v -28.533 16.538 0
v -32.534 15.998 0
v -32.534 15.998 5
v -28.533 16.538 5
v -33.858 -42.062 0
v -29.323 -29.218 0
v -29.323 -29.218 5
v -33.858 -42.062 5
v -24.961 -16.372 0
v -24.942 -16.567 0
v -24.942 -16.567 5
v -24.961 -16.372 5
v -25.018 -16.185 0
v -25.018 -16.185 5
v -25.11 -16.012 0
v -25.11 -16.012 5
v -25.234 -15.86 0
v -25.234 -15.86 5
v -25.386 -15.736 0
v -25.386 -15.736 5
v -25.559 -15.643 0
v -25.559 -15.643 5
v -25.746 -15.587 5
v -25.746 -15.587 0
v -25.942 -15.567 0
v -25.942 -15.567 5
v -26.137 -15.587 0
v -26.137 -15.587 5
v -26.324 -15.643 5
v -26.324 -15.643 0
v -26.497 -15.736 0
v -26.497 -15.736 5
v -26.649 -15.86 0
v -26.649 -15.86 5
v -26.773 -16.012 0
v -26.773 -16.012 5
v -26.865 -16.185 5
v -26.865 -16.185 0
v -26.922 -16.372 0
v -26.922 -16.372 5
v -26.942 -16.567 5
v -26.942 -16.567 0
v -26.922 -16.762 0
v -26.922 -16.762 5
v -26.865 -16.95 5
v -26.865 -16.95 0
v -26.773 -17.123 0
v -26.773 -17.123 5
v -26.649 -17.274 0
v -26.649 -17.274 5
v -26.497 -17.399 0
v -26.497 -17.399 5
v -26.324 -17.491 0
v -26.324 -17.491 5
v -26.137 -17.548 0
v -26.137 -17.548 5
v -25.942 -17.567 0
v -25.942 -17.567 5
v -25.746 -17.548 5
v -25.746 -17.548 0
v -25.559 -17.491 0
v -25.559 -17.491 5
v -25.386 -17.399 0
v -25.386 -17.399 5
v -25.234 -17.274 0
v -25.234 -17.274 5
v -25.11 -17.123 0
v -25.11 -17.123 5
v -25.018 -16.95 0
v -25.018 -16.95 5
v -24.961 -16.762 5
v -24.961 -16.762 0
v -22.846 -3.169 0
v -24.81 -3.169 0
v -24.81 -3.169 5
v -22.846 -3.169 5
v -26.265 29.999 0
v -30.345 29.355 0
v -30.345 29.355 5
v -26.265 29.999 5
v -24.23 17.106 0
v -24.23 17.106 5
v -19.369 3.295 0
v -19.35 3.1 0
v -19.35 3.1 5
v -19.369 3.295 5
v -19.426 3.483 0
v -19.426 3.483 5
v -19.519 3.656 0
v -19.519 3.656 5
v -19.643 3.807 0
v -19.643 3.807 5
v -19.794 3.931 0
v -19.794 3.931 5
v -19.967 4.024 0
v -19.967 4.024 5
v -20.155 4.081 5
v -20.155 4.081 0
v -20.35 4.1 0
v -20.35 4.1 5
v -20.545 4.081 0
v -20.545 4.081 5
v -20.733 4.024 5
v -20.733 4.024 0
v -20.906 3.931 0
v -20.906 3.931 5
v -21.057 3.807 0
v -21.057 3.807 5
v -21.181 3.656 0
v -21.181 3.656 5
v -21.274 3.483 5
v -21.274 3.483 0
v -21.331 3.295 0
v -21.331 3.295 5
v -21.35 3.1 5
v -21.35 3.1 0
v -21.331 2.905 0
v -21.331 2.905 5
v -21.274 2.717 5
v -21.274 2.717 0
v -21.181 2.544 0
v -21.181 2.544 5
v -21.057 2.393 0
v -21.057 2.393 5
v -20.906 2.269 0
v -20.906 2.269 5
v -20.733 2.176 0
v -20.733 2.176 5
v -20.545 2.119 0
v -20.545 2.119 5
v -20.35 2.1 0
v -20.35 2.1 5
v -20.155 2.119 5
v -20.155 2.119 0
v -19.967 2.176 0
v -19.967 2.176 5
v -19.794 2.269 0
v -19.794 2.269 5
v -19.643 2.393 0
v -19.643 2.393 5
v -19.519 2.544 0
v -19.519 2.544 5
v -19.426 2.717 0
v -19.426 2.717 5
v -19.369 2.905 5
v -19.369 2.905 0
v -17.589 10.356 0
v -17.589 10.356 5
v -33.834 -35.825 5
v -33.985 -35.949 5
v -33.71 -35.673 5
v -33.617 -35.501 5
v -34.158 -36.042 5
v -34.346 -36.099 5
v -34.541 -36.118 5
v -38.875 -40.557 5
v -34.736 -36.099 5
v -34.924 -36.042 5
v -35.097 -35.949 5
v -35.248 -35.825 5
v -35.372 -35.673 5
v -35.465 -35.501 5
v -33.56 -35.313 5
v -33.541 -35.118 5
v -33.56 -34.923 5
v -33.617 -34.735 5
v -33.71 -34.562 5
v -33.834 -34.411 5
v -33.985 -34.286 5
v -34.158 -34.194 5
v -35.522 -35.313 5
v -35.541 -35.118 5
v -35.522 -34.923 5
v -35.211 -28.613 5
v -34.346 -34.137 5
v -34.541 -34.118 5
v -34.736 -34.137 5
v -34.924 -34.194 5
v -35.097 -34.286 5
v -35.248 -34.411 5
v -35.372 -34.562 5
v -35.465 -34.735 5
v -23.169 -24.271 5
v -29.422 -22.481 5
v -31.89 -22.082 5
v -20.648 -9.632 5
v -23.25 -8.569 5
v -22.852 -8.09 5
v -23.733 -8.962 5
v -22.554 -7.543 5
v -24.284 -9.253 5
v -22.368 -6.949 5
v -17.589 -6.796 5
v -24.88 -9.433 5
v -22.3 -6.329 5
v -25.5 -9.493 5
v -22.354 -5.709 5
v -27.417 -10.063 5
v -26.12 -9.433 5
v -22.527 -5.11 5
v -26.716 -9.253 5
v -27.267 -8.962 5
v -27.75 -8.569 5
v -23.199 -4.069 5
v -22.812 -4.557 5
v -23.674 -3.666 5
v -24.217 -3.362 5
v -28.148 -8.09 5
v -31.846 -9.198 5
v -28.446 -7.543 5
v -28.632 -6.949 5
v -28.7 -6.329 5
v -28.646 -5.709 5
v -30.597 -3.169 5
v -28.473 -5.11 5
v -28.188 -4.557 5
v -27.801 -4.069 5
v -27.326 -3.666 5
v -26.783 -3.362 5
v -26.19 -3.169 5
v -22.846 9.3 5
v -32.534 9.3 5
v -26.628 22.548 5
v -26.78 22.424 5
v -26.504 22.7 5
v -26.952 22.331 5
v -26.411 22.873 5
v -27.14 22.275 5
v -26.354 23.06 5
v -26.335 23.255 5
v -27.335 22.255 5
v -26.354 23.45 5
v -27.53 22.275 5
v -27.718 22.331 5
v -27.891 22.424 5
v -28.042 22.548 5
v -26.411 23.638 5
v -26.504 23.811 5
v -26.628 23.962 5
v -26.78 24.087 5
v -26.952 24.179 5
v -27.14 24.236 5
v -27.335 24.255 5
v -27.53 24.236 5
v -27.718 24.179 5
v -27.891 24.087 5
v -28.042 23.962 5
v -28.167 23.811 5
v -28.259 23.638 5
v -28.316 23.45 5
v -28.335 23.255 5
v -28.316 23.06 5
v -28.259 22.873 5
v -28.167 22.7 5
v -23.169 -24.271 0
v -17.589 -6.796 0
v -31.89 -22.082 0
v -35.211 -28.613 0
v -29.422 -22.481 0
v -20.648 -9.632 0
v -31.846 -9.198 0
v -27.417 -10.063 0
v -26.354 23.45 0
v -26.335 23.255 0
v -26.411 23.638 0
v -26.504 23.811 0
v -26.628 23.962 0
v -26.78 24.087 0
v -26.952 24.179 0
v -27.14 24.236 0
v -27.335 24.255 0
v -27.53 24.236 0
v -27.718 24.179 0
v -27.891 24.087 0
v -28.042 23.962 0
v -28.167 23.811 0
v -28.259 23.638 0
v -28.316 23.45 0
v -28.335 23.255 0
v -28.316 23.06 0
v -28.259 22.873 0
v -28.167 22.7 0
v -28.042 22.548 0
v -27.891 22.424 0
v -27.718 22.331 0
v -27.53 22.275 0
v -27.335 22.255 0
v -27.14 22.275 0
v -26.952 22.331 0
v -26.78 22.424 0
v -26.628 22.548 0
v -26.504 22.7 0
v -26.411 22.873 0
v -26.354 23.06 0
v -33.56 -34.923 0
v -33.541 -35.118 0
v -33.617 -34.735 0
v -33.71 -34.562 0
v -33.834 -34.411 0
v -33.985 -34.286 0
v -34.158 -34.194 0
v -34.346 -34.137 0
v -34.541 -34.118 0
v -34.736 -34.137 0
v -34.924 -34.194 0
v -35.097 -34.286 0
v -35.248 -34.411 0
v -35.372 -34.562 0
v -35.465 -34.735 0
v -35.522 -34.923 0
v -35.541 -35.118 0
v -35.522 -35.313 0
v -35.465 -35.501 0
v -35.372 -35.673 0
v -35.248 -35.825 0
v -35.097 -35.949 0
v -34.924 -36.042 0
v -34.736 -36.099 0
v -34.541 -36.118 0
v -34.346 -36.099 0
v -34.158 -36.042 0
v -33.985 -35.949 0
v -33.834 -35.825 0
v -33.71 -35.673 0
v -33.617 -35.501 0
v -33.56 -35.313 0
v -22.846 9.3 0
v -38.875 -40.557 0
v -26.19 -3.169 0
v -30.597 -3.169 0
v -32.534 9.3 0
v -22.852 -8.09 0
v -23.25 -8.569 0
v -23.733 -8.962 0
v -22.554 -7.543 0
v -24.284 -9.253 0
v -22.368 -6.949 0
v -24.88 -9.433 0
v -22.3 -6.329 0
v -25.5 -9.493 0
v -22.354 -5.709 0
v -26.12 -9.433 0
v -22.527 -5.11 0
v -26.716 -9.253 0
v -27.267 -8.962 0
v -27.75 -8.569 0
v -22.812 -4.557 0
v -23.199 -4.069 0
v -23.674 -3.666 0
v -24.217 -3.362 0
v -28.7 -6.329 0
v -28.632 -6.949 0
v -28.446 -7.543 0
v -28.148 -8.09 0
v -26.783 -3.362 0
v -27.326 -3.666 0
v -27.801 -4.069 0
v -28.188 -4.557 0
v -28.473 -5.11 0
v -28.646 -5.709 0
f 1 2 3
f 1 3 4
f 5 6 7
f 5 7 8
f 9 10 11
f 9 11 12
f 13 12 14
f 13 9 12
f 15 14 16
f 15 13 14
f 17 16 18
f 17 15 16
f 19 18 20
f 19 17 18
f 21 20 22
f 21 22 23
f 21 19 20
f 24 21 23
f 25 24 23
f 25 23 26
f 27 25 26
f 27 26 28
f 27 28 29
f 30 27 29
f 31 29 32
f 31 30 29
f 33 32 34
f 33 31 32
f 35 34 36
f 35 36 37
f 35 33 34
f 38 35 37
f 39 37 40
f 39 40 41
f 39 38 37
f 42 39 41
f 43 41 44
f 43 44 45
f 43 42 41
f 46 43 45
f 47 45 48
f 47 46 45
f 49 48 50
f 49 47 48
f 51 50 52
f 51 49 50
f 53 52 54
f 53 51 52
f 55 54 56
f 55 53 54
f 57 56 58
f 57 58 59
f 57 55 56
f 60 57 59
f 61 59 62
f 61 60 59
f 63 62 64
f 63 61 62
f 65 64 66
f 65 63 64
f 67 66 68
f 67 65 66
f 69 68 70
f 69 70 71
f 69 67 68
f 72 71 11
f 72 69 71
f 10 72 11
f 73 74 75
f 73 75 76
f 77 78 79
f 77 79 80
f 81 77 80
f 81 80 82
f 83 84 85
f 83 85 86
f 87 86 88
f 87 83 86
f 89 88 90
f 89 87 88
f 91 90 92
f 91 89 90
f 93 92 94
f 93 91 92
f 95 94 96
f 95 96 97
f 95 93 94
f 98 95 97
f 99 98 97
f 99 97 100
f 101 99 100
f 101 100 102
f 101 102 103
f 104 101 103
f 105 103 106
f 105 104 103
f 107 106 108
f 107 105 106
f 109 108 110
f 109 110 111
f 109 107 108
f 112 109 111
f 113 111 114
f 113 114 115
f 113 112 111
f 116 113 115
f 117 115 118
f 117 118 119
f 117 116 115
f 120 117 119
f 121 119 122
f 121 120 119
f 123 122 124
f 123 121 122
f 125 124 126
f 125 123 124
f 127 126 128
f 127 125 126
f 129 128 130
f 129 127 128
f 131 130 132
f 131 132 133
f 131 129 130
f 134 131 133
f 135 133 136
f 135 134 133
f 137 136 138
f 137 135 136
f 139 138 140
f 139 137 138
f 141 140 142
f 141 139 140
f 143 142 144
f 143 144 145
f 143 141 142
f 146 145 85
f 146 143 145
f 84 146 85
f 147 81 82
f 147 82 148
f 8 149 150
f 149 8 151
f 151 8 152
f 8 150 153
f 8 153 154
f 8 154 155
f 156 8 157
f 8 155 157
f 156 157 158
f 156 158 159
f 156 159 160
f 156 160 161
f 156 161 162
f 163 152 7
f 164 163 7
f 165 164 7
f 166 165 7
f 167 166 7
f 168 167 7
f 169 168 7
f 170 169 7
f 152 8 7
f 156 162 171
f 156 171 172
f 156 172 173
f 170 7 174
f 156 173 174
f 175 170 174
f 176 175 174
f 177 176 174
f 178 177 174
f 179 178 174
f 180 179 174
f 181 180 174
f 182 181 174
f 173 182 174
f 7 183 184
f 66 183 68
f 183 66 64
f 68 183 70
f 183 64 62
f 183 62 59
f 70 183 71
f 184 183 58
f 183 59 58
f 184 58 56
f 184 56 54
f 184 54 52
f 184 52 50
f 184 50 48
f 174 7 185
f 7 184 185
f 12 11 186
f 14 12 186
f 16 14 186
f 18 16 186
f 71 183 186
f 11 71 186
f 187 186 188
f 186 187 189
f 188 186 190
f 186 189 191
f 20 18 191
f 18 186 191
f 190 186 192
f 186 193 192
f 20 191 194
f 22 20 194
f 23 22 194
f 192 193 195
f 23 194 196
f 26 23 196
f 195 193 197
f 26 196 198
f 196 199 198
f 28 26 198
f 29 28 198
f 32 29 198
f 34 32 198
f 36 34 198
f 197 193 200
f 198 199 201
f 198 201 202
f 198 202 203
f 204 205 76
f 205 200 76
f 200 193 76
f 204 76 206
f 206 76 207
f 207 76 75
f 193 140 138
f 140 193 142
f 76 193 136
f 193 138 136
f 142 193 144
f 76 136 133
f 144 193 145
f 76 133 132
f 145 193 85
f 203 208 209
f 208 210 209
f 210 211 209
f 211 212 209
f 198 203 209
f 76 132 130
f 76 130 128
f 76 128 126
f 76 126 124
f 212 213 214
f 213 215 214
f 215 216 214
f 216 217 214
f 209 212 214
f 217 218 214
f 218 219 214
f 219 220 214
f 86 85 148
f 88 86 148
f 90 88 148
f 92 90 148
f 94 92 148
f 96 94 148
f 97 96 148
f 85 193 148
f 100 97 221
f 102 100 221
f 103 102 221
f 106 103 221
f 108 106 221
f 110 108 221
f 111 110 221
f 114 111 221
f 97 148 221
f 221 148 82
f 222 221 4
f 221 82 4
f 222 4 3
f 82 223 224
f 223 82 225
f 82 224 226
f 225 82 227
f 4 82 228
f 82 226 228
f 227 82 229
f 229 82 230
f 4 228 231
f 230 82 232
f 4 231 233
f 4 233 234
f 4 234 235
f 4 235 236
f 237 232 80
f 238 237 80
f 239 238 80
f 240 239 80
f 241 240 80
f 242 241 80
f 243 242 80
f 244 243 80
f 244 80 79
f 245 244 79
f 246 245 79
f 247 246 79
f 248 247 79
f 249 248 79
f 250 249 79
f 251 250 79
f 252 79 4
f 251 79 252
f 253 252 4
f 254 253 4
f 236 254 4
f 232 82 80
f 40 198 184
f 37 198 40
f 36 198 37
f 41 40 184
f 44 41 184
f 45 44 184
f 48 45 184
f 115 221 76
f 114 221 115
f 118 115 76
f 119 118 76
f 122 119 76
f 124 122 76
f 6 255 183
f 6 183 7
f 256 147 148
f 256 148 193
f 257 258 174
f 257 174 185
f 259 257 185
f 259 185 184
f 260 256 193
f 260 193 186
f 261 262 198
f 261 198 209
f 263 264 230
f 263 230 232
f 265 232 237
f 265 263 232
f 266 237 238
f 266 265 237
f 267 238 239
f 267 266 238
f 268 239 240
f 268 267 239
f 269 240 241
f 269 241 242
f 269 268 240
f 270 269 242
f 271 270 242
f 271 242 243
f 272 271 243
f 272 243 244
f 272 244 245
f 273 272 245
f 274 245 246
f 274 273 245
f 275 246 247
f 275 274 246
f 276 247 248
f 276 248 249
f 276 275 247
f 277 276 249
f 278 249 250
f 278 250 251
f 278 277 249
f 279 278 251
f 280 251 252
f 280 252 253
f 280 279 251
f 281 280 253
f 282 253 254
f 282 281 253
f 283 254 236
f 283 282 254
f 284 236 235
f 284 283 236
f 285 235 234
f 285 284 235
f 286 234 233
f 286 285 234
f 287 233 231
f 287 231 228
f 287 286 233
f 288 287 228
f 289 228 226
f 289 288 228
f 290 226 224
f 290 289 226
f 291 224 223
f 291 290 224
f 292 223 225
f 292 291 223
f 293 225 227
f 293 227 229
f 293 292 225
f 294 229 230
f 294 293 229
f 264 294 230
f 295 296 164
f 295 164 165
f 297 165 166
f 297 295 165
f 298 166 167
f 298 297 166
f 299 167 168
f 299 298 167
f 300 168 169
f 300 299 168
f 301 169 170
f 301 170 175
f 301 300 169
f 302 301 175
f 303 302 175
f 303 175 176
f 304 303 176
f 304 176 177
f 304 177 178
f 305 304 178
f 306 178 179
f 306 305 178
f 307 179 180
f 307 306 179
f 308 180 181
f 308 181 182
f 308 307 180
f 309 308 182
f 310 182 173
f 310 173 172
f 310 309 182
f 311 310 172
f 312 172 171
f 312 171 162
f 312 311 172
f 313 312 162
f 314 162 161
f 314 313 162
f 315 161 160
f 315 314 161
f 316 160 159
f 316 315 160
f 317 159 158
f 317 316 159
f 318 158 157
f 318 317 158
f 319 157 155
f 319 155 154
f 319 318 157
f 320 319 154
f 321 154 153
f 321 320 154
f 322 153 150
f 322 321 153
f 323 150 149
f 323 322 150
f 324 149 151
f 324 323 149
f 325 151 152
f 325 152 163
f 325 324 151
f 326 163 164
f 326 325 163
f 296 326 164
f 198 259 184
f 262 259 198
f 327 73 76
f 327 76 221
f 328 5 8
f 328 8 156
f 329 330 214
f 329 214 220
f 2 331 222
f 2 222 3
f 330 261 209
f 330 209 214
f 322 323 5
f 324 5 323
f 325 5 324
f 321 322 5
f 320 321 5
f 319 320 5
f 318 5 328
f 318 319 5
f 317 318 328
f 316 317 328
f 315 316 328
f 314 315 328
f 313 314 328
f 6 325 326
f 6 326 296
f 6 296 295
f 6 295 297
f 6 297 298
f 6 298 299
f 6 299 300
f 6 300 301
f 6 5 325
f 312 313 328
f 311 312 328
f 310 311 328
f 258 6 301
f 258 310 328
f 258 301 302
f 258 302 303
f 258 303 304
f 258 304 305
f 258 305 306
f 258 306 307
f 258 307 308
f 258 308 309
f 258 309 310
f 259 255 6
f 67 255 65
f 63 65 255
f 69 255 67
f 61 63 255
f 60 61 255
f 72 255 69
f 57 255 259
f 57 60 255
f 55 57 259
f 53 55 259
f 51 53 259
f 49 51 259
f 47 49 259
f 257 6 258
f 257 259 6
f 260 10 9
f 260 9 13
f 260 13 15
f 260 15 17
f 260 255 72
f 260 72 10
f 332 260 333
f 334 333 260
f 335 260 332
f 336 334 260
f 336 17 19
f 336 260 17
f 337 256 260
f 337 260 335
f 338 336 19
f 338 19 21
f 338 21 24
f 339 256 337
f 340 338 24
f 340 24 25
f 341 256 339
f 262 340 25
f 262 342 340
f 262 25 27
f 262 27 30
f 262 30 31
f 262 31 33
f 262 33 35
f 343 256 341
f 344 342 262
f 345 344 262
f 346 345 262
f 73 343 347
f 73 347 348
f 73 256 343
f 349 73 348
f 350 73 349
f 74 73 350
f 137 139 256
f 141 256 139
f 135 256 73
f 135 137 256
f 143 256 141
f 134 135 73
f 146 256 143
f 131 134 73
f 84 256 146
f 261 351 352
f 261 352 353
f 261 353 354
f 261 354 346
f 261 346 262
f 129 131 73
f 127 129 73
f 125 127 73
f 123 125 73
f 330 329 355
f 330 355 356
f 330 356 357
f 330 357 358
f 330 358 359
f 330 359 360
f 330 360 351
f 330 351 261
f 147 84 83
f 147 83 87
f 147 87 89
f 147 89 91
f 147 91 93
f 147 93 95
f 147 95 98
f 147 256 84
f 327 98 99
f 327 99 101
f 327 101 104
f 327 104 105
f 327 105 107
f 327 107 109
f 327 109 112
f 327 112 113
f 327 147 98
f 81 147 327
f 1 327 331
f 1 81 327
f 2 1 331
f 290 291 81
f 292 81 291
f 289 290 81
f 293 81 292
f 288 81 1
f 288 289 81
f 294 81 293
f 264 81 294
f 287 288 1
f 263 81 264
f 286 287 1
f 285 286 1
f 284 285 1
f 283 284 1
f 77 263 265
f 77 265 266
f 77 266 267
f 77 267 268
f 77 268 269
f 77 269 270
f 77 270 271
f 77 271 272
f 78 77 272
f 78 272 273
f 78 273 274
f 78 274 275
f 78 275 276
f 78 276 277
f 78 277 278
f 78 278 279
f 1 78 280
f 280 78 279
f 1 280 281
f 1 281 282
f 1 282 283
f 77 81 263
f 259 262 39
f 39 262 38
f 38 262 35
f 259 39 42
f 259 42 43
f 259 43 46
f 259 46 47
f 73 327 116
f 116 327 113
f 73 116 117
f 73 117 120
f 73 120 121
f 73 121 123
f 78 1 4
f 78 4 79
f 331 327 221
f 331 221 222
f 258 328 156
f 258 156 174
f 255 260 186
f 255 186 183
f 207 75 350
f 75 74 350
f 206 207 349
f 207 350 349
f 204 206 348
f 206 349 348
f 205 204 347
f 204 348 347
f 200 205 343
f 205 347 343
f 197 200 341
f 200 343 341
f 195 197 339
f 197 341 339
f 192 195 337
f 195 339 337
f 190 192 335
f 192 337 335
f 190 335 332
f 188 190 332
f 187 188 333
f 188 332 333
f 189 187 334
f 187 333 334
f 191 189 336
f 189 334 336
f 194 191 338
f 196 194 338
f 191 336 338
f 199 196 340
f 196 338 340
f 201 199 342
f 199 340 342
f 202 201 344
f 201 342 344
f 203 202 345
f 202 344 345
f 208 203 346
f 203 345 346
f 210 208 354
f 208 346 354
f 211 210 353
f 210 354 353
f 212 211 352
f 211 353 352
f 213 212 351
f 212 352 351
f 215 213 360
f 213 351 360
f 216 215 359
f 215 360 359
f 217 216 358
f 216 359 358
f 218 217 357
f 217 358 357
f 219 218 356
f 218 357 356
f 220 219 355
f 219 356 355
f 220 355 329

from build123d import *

# Parameters (mm, degrees)
SKETCH1_R           = 1
BOSS_EXTRUDE1_DEPTH = 5
SKETCH2_R           = 3.2
CUT_EXTRUDE1_DEPTH  = 6


with BuildPart() as part:
    # Sketch1 → Boss-Extrude1 (new body)
    with BuildSketch(Plane.XY):
        Polygon((-30.344978495, 29.354997846), (-26.26481101, 29.998979434), (-24.229853855, 17.105806435), (-17.589395727, 10.355662433), (-17.589395727, -6.795999984), (-20.648203061, -9.632059779), (-23.169168461, -24.271324462), (-29.322804804, -29.218365444), (-33.858296815, -42.061599658), (-38.875160748, -40.557320866), (-35.210826338, -28.612806279), (-31.890475236, -22.08234188), (-29.422452502, -22.48091908), (-27.416937939, -10.06260833), (-31.846007079, -9.19781647), (-30.596587071, -3.168743327), (-22.846023992, -3.168743327), (-22.846023992, 9.3), (-32.534265366, 9.3), (-32.534265366, 15.998319193), (-28.533481358, 16.537502585), align=None)
        with Locations((-27.335083026, 23.255353238)):
            Circle(SKETCH1_R, mode=Mode.SUBTRACT)
        with Locations((-20.35, 3.1)):
            Circle(SKETCH1_R, mode=Mode.SUBTRACT)
        with Locations((-25.941584057, -16.567336204)):
            Circle(SKETCH1_R, mode=Mode.SUBTRACT)
        with Locations((-34.540975654, -35.117818403)):
            Circle(SKETCH1_R, mode=Mode.SUBTRACT)
    extrude(amount=BOSS_EXTRUDE1_DEPTH)

    # Sketch2 → Cut-Extrude1 (cut, through all)
    with BuildSketch(Plane(origin=(0, 0, 0), x_dir=(-1, 0, 0), z_dir=(0, 0, -1))):
        with Locations((25.5, -6.29339012)):
            Circle(SKETCH2_R)
    extrude(amount=-CUT_EXTRUDE1_DEPTH, mode=Mode.SUBTRACT)


solid = part.part
